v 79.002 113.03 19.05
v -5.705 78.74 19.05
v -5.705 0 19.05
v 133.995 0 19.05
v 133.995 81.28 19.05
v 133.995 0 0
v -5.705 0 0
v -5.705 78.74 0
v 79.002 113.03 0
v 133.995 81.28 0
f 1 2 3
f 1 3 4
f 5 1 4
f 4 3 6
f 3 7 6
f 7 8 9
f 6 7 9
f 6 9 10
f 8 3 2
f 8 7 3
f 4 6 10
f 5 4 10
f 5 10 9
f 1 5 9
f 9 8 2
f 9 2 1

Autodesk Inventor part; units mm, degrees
ref_plane "YZ Plane" through (0, 0, 0) normal (1, 0, 0) x (0, 1, 0)
ref_plane "XZ Plane" through (0, 0, 0) normal (0, 1, 0) x (-1, 0, 0)
ref_plane "XY Plane" through (0, 0, 0) normal (0, 0, 1) x (1, 0, 0)
sketch "Sketch1" plane through (0, 0, 0) normal (0, 0, 1) x (1, 0, 0)
  line L0 (-5.7054, 0) -> (133.9946, 0)
  line L1 (133.9946, 0) -> (133.9946, 81.28)
  line L2 (133.9946, 81.28) -> (79.002, 113.03)
  line L3 (-5.7054, 0) -> (-5.7054, 78.74)
  line L4 (-5.7054, 78.74) -> (79.002, 113.03)
  point P0 (0, 0)
  dimension "d0" = 139.7
  dimension "d1" = 81.28
  dimension "d2" = 63.5
  dimension "d3" = 120
  dimension "d4" = 78.74
extrude "Extrusion1" add sketch "Sketch1" along normal blind 19.05
properties part number "side battery"
